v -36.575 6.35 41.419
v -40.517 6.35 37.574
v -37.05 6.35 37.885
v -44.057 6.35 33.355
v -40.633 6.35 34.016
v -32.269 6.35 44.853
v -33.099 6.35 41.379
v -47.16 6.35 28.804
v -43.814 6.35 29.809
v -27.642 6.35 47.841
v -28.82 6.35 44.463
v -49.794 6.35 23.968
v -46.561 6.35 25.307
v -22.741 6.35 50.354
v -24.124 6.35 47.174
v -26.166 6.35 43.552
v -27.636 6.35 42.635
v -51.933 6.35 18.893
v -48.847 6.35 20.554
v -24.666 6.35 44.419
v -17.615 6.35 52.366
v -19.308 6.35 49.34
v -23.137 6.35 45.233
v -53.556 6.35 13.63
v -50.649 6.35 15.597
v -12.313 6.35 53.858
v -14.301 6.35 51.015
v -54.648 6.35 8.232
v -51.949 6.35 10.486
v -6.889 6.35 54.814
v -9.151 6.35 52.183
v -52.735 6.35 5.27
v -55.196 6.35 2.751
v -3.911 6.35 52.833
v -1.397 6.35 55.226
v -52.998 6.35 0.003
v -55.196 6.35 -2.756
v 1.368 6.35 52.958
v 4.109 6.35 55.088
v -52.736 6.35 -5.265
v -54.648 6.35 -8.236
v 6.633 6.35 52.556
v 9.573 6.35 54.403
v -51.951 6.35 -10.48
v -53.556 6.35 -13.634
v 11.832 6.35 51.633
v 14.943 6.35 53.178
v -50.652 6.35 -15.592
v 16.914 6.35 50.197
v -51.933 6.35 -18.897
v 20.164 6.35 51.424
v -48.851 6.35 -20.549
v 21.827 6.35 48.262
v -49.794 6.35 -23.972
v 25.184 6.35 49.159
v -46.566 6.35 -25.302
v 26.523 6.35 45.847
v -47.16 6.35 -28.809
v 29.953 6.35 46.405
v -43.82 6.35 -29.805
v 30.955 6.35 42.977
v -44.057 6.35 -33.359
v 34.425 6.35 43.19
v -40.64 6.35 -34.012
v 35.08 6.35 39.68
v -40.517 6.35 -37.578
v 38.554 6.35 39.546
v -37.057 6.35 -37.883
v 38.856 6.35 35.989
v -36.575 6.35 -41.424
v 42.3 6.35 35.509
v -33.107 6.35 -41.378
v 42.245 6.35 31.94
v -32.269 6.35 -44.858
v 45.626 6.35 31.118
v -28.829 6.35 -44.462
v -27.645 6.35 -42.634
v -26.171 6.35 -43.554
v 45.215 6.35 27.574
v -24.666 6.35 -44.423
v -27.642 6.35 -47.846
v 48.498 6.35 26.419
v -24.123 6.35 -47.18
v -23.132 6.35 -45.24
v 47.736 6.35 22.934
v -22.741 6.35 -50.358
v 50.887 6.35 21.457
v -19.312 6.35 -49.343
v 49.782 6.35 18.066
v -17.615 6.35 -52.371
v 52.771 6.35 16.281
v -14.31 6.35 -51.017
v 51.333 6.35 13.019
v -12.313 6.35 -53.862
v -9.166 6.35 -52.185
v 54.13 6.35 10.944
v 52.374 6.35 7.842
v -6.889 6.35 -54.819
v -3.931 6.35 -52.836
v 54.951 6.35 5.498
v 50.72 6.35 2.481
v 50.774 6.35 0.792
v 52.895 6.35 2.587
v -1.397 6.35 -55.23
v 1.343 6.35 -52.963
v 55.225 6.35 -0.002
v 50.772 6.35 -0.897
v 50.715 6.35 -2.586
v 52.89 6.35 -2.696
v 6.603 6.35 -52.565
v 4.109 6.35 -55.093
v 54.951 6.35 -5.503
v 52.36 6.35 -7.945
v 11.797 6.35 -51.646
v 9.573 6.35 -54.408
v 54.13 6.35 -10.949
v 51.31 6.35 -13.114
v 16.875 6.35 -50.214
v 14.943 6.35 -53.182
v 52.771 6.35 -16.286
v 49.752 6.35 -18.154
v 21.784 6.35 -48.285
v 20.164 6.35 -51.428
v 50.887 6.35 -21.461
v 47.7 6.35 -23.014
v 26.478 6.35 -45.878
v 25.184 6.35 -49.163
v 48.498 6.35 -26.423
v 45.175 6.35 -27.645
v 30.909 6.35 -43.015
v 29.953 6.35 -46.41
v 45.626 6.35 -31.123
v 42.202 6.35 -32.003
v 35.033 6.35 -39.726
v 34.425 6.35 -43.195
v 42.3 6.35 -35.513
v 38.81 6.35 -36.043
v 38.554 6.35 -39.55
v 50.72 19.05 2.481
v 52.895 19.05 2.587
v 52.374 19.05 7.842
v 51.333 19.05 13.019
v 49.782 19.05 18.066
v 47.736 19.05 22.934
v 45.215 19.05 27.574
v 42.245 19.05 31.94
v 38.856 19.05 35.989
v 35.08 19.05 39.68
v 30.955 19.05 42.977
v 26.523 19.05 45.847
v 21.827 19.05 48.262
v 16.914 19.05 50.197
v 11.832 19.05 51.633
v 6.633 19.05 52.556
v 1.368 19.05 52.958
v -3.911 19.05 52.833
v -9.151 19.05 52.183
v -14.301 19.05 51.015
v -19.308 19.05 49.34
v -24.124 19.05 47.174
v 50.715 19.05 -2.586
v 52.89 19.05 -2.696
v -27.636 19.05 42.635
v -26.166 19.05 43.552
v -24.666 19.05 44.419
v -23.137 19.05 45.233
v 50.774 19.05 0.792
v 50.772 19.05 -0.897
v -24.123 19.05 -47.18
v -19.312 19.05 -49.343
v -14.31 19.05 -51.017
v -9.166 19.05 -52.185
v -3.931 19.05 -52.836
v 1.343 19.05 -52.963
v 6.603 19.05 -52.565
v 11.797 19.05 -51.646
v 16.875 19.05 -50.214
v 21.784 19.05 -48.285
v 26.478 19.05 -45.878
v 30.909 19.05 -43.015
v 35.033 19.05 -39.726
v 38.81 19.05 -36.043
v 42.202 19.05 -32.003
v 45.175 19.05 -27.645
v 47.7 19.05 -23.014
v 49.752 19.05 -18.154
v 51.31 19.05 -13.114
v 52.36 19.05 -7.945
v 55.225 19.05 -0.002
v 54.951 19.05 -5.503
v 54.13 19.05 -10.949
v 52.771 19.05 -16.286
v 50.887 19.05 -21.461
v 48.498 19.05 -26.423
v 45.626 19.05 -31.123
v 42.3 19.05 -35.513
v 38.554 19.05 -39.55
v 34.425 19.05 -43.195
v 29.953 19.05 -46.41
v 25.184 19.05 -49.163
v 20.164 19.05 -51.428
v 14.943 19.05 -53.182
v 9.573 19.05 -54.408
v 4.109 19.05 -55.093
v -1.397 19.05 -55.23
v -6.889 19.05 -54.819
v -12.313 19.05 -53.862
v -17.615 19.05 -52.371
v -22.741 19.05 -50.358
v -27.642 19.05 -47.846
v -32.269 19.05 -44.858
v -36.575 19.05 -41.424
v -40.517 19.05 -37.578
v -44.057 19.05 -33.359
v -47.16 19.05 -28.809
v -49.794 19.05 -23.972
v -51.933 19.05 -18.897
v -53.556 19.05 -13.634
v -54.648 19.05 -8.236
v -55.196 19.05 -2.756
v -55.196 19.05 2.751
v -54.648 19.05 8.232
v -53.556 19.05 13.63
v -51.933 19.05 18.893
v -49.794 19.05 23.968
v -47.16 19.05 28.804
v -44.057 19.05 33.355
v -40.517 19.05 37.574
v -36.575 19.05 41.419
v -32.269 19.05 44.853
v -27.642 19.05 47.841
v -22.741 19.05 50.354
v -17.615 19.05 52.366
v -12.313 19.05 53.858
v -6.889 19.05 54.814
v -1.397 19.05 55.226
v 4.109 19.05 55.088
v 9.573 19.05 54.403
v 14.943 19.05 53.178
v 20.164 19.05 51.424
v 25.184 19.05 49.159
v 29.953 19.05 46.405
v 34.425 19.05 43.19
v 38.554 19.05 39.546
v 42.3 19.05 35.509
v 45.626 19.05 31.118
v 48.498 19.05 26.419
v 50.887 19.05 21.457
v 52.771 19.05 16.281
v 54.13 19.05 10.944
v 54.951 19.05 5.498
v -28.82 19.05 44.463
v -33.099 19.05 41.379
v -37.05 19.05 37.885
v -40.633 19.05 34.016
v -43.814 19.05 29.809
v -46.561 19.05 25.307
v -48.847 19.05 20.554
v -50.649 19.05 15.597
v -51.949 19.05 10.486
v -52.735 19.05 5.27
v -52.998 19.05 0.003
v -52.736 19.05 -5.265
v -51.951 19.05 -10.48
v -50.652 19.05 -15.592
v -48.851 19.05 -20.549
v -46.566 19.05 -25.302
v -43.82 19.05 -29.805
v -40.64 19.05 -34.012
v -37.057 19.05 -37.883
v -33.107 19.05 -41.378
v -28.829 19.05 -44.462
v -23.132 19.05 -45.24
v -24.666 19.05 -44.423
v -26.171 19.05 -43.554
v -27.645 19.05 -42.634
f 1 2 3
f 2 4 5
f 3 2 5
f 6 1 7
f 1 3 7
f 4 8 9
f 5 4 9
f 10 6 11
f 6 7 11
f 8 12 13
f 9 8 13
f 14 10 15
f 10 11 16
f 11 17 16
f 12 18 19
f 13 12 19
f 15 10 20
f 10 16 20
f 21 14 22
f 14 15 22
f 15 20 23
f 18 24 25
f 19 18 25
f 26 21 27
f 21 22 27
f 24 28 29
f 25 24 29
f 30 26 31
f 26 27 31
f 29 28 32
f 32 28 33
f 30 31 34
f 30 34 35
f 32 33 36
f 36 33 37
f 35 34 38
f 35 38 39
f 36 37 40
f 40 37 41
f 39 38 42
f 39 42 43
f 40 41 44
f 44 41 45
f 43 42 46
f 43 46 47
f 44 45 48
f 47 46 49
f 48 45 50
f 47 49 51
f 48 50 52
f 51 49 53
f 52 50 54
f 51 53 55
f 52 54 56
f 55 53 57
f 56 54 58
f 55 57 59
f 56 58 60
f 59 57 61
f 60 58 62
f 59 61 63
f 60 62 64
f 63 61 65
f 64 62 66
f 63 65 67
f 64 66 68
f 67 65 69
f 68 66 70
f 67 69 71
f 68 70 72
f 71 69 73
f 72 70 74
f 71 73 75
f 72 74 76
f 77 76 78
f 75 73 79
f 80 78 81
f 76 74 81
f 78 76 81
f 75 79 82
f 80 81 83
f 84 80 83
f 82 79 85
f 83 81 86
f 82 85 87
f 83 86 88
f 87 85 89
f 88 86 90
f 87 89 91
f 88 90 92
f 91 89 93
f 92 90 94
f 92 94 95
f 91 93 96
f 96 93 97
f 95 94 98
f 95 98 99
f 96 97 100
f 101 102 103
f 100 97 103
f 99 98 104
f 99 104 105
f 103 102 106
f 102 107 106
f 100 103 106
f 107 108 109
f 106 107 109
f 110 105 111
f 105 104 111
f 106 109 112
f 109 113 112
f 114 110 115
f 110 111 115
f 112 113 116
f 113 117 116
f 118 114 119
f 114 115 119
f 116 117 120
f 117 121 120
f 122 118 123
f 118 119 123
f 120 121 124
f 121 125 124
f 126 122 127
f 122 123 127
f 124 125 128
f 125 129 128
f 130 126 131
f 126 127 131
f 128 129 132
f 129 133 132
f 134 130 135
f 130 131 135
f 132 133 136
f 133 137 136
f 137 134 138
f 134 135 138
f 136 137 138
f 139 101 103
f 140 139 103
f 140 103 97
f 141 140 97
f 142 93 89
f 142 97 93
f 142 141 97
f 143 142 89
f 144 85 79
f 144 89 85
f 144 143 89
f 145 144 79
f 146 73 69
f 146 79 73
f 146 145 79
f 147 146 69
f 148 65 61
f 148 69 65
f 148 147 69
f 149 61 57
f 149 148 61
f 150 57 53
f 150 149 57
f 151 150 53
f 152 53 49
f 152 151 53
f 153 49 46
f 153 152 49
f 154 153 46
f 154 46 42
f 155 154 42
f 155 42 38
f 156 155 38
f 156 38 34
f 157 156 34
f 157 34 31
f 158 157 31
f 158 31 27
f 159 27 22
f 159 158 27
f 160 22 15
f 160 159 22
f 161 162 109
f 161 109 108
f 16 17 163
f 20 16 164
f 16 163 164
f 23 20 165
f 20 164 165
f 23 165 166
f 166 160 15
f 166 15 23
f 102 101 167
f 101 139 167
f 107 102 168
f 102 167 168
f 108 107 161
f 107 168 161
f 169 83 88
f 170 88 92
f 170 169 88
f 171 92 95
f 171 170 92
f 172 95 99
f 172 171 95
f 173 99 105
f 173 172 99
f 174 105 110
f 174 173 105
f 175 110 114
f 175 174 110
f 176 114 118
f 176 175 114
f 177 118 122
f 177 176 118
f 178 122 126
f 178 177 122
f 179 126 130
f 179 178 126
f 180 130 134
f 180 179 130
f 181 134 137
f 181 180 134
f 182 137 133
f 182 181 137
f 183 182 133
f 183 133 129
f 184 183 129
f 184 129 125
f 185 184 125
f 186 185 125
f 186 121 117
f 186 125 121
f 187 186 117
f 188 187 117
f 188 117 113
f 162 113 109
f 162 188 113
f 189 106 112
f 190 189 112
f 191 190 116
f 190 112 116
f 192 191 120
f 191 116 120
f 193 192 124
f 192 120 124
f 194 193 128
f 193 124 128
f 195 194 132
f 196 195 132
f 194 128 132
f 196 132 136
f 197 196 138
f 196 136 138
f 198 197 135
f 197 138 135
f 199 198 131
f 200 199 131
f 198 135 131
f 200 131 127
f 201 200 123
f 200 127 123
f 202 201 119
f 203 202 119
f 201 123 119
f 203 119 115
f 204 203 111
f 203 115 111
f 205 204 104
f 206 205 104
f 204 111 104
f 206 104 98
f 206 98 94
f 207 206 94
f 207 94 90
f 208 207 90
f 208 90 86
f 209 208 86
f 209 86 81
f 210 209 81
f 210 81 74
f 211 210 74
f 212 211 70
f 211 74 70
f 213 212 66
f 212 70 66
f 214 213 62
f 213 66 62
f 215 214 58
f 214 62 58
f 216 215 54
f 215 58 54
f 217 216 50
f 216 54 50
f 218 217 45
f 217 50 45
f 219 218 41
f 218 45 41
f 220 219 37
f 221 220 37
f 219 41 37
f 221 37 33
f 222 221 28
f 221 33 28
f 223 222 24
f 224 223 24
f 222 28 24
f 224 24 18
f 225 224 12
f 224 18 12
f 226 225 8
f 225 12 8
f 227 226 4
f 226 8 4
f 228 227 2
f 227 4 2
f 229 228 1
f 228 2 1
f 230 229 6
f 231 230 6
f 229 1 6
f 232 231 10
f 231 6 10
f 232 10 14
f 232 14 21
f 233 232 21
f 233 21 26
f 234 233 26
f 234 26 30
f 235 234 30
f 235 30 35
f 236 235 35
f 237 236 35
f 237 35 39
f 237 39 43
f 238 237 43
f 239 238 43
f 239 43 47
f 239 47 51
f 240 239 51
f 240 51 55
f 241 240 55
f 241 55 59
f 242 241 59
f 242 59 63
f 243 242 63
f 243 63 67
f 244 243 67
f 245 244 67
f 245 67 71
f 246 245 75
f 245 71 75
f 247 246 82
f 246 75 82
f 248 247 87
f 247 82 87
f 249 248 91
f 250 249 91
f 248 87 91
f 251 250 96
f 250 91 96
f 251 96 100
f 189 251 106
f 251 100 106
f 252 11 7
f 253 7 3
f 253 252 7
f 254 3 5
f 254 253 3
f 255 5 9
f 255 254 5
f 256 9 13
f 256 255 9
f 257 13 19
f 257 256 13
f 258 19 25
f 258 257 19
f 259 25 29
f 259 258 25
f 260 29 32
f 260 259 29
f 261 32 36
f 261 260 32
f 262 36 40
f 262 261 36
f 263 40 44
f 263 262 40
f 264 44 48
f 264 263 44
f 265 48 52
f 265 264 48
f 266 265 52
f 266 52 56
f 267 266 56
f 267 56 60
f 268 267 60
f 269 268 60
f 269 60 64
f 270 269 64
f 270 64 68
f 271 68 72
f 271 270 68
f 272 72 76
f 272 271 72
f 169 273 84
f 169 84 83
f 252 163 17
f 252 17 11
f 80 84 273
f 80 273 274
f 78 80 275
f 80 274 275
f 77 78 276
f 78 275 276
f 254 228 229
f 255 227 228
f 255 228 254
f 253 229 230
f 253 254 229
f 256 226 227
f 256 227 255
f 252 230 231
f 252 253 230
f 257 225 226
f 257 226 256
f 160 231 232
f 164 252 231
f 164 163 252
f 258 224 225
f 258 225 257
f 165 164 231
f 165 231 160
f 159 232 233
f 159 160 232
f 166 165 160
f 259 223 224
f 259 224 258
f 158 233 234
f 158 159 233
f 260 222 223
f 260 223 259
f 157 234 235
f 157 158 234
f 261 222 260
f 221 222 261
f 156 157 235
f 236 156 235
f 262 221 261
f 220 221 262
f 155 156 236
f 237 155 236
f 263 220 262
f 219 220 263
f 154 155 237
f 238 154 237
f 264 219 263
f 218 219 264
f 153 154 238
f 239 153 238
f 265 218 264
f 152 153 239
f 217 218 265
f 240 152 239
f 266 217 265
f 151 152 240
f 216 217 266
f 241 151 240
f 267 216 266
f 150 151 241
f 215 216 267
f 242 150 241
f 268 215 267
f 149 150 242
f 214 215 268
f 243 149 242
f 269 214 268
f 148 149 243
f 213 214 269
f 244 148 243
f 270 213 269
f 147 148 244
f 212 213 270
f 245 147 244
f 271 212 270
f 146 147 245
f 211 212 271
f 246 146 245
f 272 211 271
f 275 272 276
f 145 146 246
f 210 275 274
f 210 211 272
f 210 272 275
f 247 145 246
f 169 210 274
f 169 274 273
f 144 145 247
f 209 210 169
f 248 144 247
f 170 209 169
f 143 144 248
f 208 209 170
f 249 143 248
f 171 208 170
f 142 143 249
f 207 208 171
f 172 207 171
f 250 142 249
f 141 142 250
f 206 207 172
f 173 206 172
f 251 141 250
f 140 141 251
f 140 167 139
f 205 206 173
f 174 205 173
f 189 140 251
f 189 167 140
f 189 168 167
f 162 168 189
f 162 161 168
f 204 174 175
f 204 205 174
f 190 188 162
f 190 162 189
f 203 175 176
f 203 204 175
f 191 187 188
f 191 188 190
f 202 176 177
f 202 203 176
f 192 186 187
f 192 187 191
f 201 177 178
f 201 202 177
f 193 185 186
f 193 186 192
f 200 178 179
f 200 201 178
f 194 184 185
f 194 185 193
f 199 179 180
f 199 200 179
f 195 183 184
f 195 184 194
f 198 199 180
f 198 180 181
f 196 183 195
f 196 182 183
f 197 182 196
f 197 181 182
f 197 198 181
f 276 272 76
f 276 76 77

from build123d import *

# Parameters (mm, degrees)
SKETCH1_R           = 110.49
BOSS_EXTRUDE1_DEPTH = 25.4
SKETCH2_R           = 101.6
CUT_EXTRUDE6_DEPTH  = 64.52
CUT_EXTRUDE7_DEPTH  = 64.52
SCALE1_SCALE        = 0.5


with BuildPart() as part:
    # Sketch1 → Boss-Extrude1 (new body)
    with BuildSketch(Plane(origin=(0, 0, 0), x_dir=(1, 0, 0), z_dir=(0, 1, 0))):
        Circle(SKETCH1_R)
    extrude(amount=BOSS_EXTRUDE1_DEPTH)

    # Sketch2 → Cut-Extrude6 (cut)
    with BuildSketch(Plane(origin=(0, 25.4, 0), x_dir=(1, 0, 0), z_dir=(0, 1, 0))):
        Circle(SKETCH2_R)
    extrude(amount=-CUT_EXTRUDE6_DEPTH, mode=Mode.SUBTRACT)

    # Sketch5 → Cut-Extrude7 (cut)
    with BuildSketch(Plane(origin=(0, 25.4, 0), x_dir=(1, 0, 0), z_dir=(0, 1, 0))):
        with BuildLine():
            Line((-46.233713441, -90.471010503), (-55.233336601, -85.275075655))
            Line((-55.233336601, -85.275075655), (-57.601465369, -88.931243691))
            ThreePointArc((-57.601465369, -88.931243691), (-105.956098512, -0.010262293), (-57.618691018, 88.920084135))
            Line((-57.618691018, 88.920084135), (-55.249854064, 85.264374893))
            Line((-55.249854064, 85.264374893), (-46.225266875, 90.475326484))
            Line((-46.225266875, 90.475326484), (-48.207174741, 94.354455224))
            ThreePointArc((-48.207174741, 94.354455224), (52.995520175, 91.750584513), (105.819002137, 5.388293237))
            Line((105.819002137, 5.388293237), (101.468539496, 5.166768105))
            Line((101.468539496, 5.166768105), (101.478542465, -4.966429217))
            Line((101.478542465, -4.966429217), (105.829433983, -5.179364822))
            ThreePointArc((105.829433983, -5.179364822), (53.084989634, -91.698848372), (-48.209389303, -94.353323737))
            Line((-48.209389303, -94.353323737), (-46.233713441, -90.471010503))
        make_face()
    extrude(amount=-CUT_EXTRUDE7_DEPTH, mode=Mode.SUBTRACT)


with BuildPart() as part_1:
    # Scale1: scaled about (-0.039482606, 12.7, -0.004547928)
    add(part.part.scale(SCALE1_SCALE).moved(Location((-0.019741303, 6.35, -0.002273964))))


solid = part_1.part
